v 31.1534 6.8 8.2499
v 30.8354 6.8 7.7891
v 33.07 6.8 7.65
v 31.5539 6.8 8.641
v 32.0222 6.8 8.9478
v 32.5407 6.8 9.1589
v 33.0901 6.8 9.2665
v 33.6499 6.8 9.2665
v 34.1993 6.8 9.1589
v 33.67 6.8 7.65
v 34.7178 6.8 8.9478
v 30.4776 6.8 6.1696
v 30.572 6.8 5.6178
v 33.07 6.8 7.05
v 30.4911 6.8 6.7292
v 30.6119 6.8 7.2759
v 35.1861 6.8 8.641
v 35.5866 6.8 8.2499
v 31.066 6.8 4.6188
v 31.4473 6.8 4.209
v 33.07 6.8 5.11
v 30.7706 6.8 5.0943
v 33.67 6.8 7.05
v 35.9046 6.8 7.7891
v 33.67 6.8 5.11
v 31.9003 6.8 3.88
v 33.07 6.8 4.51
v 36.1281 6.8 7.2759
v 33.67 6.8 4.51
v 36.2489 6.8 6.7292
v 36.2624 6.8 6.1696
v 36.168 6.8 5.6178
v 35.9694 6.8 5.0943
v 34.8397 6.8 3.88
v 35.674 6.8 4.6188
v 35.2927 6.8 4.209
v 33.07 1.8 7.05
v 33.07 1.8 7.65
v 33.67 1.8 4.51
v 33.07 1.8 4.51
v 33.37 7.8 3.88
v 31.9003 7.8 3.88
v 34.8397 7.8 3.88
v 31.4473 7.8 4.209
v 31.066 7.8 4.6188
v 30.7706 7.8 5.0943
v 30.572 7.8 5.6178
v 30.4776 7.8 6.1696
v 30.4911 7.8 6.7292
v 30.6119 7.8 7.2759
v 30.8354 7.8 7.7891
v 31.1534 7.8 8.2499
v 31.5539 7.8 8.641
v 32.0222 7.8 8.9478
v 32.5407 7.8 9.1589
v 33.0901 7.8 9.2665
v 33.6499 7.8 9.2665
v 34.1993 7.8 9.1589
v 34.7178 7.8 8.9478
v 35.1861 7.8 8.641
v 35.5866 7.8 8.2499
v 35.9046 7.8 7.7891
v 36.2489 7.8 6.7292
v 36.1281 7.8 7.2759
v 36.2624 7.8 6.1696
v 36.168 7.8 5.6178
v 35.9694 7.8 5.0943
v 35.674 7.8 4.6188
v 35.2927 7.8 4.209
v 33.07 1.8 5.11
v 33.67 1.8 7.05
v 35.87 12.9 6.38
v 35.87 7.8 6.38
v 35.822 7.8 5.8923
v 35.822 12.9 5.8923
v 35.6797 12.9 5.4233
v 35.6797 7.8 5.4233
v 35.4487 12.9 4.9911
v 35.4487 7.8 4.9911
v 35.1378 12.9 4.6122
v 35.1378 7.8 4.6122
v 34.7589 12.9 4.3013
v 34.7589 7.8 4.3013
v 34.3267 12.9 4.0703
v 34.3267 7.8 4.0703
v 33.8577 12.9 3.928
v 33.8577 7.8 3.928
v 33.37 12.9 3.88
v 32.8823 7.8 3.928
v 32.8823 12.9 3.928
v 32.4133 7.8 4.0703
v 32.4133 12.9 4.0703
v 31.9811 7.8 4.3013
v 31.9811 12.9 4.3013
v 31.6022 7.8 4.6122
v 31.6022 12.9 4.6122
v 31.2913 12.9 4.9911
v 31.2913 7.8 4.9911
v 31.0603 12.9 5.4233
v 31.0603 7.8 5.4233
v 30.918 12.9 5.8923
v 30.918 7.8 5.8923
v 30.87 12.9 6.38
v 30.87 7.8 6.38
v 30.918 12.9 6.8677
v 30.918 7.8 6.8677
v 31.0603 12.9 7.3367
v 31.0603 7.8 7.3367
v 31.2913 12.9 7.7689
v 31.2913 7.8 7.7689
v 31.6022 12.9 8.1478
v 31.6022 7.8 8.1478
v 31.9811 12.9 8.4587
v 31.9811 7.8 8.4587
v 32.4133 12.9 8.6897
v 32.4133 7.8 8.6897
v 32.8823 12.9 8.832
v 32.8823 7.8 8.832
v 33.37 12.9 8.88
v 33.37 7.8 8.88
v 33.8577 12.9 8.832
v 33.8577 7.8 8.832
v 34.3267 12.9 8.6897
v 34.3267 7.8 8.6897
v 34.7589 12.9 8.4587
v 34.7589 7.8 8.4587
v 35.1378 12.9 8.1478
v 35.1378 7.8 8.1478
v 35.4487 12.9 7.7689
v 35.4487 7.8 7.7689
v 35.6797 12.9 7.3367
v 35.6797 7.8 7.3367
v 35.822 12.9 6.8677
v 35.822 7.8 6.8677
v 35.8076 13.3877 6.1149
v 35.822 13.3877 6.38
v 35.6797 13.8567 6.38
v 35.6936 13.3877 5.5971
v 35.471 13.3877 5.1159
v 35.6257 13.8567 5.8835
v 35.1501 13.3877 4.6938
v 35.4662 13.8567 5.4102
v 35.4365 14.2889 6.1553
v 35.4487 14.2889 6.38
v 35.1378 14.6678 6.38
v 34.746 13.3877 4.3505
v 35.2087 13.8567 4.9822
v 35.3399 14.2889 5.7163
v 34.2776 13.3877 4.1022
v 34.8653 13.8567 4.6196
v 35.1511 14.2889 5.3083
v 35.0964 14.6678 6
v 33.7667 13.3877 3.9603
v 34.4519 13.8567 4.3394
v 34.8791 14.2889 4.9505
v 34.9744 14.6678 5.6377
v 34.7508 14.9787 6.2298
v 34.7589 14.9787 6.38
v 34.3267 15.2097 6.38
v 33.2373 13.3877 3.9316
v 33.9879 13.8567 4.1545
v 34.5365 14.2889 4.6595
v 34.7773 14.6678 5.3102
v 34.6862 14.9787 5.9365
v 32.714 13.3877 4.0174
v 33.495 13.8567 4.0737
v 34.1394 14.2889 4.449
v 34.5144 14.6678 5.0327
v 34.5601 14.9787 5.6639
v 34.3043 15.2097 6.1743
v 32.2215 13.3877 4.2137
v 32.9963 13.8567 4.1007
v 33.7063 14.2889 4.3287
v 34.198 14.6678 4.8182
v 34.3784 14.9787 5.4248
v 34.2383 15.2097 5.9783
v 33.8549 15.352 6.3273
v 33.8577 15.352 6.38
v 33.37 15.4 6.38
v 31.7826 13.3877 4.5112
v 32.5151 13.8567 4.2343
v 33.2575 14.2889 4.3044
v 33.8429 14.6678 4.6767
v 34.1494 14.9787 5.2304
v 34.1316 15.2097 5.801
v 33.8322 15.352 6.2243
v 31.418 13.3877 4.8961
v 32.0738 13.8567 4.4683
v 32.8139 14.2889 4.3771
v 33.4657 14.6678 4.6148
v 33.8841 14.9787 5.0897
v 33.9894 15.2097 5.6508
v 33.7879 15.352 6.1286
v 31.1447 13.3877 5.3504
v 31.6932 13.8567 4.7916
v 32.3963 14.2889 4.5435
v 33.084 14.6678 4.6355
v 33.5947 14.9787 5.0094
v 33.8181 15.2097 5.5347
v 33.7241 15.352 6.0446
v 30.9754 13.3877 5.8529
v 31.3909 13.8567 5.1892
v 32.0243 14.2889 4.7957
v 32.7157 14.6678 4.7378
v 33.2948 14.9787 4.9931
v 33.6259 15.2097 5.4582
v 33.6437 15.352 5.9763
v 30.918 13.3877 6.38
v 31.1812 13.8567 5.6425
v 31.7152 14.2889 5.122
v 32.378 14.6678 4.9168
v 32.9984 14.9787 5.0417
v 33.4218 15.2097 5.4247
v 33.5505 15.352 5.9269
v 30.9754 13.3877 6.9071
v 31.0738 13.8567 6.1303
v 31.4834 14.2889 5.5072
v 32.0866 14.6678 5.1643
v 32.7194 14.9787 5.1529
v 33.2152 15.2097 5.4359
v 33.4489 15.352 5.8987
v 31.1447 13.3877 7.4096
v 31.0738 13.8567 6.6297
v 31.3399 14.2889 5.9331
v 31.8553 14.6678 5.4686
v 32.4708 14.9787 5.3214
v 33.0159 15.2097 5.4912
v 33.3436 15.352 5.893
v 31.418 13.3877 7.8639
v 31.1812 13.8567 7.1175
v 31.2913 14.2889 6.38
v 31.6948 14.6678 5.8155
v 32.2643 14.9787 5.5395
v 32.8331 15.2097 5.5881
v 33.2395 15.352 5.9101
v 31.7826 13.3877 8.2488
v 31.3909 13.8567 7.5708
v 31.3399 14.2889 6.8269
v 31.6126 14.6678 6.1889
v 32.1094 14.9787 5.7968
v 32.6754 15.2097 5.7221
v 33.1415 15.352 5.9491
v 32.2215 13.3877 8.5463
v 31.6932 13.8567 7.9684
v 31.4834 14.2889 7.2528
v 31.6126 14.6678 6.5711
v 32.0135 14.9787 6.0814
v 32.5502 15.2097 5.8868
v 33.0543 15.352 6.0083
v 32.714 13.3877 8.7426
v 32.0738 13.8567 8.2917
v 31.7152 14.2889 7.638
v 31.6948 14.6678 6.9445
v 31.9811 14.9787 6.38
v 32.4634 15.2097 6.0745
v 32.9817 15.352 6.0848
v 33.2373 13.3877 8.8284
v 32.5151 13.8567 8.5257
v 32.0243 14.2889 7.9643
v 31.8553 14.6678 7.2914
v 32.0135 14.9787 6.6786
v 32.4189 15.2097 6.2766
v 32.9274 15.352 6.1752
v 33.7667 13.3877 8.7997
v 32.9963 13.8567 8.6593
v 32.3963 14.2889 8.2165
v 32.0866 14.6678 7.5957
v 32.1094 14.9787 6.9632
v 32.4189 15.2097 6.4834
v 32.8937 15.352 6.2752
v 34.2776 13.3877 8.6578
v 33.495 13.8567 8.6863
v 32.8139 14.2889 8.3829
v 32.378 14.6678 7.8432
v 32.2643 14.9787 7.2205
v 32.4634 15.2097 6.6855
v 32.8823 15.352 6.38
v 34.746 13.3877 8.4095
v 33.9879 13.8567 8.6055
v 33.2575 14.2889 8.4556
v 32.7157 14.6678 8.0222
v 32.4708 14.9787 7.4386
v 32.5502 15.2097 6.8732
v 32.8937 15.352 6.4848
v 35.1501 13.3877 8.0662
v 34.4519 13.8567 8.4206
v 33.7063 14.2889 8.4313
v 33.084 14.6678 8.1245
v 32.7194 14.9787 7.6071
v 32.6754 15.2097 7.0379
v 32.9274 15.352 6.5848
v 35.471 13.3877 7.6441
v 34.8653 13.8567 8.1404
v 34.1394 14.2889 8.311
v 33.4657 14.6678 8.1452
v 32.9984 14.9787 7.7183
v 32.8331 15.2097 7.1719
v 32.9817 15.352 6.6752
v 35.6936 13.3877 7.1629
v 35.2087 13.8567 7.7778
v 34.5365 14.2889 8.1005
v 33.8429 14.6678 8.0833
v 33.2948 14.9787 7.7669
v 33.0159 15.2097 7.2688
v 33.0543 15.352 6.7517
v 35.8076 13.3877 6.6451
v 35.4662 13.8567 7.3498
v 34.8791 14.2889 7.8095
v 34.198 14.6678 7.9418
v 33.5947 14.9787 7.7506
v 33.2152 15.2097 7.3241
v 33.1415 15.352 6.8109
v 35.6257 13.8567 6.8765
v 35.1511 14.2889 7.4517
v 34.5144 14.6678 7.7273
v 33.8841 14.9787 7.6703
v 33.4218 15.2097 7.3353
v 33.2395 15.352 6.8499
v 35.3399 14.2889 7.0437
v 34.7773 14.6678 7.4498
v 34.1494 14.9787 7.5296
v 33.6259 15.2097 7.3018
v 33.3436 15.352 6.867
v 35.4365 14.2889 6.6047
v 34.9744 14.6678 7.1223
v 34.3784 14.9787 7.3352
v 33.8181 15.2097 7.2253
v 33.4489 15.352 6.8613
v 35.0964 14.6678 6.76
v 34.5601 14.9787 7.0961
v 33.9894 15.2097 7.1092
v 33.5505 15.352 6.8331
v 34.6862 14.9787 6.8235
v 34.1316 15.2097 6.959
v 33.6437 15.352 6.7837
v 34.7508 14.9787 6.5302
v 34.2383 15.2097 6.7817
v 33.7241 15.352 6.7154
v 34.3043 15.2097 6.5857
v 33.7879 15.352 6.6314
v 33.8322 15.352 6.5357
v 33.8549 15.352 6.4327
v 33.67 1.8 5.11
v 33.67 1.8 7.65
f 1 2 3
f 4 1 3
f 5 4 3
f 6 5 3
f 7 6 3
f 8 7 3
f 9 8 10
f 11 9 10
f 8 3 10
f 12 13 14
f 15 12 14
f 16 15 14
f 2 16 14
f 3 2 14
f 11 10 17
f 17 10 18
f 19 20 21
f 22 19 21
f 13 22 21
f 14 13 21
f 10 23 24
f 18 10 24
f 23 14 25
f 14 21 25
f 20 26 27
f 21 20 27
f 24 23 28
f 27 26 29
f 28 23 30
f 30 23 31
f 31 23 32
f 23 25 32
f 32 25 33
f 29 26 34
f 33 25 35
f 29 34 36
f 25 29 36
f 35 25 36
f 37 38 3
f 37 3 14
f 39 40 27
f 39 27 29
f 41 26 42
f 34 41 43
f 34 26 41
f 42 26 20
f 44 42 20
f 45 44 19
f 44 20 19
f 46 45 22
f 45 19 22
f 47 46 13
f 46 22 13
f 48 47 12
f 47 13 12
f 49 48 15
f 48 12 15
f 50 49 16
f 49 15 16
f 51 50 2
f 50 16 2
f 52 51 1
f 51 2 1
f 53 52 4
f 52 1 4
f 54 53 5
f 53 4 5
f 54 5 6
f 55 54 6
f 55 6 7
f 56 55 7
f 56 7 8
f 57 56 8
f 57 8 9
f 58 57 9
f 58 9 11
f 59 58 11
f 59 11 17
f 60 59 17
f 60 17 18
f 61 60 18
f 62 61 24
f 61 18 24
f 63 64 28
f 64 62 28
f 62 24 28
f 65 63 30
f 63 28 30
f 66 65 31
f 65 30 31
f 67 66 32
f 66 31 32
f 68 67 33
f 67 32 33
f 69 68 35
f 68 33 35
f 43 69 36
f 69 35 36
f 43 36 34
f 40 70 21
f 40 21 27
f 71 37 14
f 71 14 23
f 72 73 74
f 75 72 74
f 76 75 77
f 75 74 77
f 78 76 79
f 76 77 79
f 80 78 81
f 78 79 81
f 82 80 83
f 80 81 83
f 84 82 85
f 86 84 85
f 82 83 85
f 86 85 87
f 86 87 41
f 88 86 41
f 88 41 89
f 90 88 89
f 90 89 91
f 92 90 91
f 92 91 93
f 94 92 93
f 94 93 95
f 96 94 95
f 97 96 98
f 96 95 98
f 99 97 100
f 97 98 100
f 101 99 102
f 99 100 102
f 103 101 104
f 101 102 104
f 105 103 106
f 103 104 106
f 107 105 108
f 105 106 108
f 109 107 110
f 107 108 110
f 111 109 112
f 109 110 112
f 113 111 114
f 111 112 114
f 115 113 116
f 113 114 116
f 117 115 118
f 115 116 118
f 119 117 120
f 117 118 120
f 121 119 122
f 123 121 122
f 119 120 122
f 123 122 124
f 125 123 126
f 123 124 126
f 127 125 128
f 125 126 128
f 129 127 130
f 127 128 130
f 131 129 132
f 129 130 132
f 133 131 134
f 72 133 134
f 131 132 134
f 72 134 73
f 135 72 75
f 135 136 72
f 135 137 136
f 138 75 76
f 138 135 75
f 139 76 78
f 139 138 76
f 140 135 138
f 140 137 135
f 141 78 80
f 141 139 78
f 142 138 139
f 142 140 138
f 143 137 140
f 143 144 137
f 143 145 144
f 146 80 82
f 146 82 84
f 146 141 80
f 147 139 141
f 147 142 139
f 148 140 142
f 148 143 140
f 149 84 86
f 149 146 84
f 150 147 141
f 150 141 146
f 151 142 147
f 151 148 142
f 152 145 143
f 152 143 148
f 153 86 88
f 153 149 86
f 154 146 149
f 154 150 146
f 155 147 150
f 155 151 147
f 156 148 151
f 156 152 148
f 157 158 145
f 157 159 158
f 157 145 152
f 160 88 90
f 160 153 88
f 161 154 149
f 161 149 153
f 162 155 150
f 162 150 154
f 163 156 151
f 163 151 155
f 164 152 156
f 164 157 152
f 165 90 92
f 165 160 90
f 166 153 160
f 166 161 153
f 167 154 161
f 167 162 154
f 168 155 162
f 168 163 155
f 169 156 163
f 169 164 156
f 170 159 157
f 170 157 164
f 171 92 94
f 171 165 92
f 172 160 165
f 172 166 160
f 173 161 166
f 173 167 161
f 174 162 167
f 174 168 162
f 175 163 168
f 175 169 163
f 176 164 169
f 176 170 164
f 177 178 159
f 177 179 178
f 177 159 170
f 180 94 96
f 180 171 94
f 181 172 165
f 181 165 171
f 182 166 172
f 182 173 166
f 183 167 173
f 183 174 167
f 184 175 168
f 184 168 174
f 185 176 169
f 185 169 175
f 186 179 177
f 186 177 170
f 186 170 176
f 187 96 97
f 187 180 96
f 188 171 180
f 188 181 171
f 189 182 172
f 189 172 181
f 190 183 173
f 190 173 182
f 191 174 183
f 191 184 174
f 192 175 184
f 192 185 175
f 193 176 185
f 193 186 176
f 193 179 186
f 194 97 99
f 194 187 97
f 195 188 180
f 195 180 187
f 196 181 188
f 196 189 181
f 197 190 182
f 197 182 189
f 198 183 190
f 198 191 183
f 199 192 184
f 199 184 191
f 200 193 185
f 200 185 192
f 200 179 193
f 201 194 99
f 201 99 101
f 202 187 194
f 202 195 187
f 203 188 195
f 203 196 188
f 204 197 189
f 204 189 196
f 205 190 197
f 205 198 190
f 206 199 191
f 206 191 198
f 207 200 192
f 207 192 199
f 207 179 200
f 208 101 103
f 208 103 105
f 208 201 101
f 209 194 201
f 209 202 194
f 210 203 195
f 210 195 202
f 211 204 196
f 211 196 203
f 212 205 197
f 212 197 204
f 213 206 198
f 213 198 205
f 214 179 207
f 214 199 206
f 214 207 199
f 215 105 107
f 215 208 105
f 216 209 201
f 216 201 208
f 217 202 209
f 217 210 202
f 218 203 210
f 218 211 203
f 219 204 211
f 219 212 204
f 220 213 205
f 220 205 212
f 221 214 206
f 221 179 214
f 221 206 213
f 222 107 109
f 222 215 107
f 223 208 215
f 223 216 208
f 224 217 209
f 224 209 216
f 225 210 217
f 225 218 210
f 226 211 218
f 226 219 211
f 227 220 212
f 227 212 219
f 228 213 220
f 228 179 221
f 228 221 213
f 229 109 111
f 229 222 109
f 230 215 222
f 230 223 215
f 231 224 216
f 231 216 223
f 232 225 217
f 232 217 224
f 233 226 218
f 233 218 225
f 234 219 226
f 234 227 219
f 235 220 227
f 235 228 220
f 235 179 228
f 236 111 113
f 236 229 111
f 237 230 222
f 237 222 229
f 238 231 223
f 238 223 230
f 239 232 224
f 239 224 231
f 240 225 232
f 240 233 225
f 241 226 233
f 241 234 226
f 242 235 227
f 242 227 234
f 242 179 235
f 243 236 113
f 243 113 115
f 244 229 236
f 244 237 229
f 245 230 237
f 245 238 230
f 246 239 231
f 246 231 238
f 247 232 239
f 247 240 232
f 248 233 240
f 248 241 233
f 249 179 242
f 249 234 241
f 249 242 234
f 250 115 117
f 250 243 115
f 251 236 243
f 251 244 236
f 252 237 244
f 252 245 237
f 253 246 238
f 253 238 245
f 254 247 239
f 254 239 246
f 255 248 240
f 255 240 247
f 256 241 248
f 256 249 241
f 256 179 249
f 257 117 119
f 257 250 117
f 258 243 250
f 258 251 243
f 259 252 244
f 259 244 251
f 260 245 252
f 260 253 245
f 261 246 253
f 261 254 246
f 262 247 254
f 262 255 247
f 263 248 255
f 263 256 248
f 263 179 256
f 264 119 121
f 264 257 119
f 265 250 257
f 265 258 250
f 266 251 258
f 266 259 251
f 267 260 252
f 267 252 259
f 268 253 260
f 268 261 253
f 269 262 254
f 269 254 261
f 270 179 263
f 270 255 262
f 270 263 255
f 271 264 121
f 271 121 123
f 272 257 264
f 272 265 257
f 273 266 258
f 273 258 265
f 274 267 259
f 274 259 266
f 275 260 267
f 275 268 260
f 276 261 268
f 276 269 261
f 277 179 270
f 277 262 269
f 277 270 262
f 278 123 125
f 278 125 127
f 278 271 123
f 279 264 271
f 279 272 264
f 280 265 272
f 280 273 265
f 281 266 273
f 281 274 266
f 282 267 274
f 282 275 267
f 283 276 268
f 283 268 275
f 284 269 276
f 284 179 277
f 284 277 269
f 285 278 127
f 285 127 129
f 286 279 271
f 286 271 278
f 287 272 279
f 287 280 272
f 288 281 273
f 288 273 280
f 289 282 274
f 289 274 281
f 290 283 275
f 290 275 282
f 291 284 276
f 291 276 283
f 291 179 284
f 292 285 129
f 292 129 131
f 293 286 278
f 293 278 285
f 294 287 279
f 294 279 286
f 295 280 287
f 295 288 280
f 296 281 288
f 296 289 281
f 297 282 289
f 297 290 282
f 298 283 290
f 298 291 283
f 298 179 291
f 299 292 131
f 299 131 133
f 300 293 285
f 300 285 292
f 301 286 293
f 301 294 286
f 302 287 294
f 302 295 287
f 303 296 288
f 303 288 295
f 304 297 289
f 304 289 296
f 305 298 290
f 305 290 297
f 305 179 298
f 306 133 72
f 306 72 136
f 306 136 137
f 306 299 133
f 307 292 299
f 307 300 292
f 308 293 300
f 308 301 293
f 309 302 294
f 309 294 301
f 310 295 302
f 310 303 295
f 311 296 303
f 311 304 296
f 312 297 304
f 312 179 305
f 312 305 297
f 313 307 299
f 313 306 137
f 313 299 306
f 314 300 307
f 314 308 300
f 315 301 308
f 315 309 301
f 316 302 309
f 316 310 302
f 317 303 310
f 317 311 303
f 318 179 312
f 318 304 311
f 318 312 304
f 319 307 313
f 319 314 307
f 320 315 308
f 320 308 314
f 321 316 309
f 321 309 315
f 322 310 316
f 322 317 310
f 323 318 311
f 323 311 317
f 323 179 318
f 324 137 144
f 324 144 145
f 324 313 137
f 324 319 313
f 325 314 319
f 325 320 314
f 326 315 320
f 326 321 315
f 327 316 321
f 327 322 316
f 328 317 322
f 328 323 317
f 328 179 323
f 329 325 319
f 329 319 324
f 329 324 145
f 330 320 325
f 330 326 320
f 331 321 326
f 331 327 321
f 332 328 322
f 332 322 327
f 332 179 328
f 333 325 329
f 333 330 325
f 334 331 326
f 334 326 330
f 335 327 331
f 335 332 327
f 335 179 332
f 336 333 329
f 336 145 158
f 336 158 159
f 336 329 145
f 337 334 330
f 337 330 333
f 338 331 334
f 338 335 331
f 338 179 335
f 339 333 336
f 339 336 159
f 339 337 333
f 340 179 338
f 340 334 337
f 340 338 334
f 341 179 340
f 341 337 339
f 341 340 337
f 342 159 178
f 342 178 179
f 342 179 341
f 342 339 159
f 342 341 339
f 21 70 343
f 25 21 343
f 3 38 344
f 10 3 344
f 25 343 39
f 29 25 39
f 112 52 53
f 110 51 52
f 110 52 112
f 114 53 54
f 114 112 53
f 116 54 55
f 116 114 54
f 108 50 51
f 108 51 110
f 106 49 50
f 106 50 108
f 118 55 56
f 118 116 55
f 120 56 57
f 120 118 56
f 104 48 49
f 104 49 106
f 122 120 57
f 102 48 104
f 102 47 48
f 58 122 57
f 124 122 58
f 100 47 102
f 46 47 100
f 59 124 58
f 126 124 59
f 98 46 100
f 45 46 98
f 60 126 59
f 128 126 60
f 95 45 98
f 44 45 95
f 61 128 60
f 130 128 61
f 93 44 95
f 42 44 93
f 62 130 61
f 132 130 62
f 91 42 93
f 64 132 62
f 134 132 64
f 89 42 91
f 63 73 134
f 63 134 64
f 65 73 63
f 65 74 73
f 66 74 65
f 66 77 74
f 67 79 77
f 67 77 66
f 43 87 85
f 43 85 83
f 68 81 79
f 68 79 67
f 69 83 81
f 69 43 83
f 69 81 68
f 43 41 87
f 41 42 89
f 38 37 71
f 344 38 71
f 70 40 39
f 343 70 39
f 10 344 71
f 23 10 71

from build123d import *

# Parameters (mm, degrees)
BOX001_W             = 0.6
BOX001_H             = 0.6
BOX001_DEPTH         = 5
BOX002_W             = 0.6
BOX002_H             = 0.6
BOX002_DEPTH         = 5
CYLINDER004_R        = 2.5
CYLINDER004_DEPTH    = 6.1
BOX_W                = 10
BOX_H                = 10
BOX_DEPTH            = 10
CYLINDER005_R        = 2.9
CYLINDER005_DEPTH    = 1
FUSION002_ROLL_ANGLE = -90


with BuildPart() as led_pin1:
    # Box001 → Box001 (new body)
    with BuildSketch(Plane(origin=(-0.3, 1.27, -5), x_dir=(1, 0, 0), z_dir=(0, 0, 1))):
        with Locations((0.3, 0.3)):
            Rectangle(BOX001_W, BOX001_H)
    extrude(amount=BOX001_DEPTH)


with BuildPart() as led_pin2:
    # Box002 → Box002 (new body)
    with BuildSketch(Plane(origin=(-0.3, -1.27, -5), x_dir=(1, 0, 0), z_dir=(0, 0, 1))):
        with Locations((0.3, 0.3)):
            Rectangle(BOX002_W, BOX002_H)
    extrude(amount=BOX002_DEPTH)


with BuildPart() as led_cyl:
    # Cylinder004 → Cylinder004 (new body)
    with BuildSketch(Plane.XY):
        Circle(CYLINDER004_R)
    extrude(amount=CYLINDER004_DEPTH)


with BuildPart() as led_key_cut:
    # Box → Box (new body)
    with BuildSketch(Plane(origin=(-5, 2.5, 0), x_dir=(1, 0, 0), z_dir=(0, 0, 1))):
        with Locations((5, 5)):
            Rectangle(BOX_W, BOX_H)
    extrude(amount=BOX_DEPTH)


with BuildPart() as cut001:
    # Cylinder005 → Cylinder005 (new body)
    with BuildSketch(Plane.XY):
        Circle(CYLINDER005_R)
    extrude(amount=CYLINDER005_DEPTH)

    # Cut001: cut led-key-cut
    add(led_key_cut.part, mode=Mode.SUBTRACT)


with BuildPart() as led5mm:
    # Sphere → Sphere (revolve)
    with BuildSketch(Plane(origin=(0, 0, 6.1), x_dir=(1, 0, 0), z_dir=(0, -1, 0))):
        with BuildLine():
            ThreePointArc((0, -2.5), (2.5, 0), (0, 2.5))
            Line((0, 2.5), (0, -2.5))
        make_face()
    revolve(axis=Axis((0, 0, 6.1), (0, 0, 1)))

    # Fusion001: union led-cyl, Cut001
    add(led_cyl.part)
    add(cut001.part)

    # Fusion002: union led-pin1, led-pin2
    add(led_pin1.part)
    add(led_pin2.part)


with BuildPart() as led5mm_1:
    # Fusion002 roll: moved
    add(led5mm.part.rotate(Axis((0, 0, 0), (1, 0, 0)), FUSION002_ROLL_ANGLE))


with BuildPart() as led5mm_2:
    # Fusion002 placement: moved
    add(led5mm_1.part.moved(Location((33.37, 6.8, 6.38))))


solid = led5mm_2.part
